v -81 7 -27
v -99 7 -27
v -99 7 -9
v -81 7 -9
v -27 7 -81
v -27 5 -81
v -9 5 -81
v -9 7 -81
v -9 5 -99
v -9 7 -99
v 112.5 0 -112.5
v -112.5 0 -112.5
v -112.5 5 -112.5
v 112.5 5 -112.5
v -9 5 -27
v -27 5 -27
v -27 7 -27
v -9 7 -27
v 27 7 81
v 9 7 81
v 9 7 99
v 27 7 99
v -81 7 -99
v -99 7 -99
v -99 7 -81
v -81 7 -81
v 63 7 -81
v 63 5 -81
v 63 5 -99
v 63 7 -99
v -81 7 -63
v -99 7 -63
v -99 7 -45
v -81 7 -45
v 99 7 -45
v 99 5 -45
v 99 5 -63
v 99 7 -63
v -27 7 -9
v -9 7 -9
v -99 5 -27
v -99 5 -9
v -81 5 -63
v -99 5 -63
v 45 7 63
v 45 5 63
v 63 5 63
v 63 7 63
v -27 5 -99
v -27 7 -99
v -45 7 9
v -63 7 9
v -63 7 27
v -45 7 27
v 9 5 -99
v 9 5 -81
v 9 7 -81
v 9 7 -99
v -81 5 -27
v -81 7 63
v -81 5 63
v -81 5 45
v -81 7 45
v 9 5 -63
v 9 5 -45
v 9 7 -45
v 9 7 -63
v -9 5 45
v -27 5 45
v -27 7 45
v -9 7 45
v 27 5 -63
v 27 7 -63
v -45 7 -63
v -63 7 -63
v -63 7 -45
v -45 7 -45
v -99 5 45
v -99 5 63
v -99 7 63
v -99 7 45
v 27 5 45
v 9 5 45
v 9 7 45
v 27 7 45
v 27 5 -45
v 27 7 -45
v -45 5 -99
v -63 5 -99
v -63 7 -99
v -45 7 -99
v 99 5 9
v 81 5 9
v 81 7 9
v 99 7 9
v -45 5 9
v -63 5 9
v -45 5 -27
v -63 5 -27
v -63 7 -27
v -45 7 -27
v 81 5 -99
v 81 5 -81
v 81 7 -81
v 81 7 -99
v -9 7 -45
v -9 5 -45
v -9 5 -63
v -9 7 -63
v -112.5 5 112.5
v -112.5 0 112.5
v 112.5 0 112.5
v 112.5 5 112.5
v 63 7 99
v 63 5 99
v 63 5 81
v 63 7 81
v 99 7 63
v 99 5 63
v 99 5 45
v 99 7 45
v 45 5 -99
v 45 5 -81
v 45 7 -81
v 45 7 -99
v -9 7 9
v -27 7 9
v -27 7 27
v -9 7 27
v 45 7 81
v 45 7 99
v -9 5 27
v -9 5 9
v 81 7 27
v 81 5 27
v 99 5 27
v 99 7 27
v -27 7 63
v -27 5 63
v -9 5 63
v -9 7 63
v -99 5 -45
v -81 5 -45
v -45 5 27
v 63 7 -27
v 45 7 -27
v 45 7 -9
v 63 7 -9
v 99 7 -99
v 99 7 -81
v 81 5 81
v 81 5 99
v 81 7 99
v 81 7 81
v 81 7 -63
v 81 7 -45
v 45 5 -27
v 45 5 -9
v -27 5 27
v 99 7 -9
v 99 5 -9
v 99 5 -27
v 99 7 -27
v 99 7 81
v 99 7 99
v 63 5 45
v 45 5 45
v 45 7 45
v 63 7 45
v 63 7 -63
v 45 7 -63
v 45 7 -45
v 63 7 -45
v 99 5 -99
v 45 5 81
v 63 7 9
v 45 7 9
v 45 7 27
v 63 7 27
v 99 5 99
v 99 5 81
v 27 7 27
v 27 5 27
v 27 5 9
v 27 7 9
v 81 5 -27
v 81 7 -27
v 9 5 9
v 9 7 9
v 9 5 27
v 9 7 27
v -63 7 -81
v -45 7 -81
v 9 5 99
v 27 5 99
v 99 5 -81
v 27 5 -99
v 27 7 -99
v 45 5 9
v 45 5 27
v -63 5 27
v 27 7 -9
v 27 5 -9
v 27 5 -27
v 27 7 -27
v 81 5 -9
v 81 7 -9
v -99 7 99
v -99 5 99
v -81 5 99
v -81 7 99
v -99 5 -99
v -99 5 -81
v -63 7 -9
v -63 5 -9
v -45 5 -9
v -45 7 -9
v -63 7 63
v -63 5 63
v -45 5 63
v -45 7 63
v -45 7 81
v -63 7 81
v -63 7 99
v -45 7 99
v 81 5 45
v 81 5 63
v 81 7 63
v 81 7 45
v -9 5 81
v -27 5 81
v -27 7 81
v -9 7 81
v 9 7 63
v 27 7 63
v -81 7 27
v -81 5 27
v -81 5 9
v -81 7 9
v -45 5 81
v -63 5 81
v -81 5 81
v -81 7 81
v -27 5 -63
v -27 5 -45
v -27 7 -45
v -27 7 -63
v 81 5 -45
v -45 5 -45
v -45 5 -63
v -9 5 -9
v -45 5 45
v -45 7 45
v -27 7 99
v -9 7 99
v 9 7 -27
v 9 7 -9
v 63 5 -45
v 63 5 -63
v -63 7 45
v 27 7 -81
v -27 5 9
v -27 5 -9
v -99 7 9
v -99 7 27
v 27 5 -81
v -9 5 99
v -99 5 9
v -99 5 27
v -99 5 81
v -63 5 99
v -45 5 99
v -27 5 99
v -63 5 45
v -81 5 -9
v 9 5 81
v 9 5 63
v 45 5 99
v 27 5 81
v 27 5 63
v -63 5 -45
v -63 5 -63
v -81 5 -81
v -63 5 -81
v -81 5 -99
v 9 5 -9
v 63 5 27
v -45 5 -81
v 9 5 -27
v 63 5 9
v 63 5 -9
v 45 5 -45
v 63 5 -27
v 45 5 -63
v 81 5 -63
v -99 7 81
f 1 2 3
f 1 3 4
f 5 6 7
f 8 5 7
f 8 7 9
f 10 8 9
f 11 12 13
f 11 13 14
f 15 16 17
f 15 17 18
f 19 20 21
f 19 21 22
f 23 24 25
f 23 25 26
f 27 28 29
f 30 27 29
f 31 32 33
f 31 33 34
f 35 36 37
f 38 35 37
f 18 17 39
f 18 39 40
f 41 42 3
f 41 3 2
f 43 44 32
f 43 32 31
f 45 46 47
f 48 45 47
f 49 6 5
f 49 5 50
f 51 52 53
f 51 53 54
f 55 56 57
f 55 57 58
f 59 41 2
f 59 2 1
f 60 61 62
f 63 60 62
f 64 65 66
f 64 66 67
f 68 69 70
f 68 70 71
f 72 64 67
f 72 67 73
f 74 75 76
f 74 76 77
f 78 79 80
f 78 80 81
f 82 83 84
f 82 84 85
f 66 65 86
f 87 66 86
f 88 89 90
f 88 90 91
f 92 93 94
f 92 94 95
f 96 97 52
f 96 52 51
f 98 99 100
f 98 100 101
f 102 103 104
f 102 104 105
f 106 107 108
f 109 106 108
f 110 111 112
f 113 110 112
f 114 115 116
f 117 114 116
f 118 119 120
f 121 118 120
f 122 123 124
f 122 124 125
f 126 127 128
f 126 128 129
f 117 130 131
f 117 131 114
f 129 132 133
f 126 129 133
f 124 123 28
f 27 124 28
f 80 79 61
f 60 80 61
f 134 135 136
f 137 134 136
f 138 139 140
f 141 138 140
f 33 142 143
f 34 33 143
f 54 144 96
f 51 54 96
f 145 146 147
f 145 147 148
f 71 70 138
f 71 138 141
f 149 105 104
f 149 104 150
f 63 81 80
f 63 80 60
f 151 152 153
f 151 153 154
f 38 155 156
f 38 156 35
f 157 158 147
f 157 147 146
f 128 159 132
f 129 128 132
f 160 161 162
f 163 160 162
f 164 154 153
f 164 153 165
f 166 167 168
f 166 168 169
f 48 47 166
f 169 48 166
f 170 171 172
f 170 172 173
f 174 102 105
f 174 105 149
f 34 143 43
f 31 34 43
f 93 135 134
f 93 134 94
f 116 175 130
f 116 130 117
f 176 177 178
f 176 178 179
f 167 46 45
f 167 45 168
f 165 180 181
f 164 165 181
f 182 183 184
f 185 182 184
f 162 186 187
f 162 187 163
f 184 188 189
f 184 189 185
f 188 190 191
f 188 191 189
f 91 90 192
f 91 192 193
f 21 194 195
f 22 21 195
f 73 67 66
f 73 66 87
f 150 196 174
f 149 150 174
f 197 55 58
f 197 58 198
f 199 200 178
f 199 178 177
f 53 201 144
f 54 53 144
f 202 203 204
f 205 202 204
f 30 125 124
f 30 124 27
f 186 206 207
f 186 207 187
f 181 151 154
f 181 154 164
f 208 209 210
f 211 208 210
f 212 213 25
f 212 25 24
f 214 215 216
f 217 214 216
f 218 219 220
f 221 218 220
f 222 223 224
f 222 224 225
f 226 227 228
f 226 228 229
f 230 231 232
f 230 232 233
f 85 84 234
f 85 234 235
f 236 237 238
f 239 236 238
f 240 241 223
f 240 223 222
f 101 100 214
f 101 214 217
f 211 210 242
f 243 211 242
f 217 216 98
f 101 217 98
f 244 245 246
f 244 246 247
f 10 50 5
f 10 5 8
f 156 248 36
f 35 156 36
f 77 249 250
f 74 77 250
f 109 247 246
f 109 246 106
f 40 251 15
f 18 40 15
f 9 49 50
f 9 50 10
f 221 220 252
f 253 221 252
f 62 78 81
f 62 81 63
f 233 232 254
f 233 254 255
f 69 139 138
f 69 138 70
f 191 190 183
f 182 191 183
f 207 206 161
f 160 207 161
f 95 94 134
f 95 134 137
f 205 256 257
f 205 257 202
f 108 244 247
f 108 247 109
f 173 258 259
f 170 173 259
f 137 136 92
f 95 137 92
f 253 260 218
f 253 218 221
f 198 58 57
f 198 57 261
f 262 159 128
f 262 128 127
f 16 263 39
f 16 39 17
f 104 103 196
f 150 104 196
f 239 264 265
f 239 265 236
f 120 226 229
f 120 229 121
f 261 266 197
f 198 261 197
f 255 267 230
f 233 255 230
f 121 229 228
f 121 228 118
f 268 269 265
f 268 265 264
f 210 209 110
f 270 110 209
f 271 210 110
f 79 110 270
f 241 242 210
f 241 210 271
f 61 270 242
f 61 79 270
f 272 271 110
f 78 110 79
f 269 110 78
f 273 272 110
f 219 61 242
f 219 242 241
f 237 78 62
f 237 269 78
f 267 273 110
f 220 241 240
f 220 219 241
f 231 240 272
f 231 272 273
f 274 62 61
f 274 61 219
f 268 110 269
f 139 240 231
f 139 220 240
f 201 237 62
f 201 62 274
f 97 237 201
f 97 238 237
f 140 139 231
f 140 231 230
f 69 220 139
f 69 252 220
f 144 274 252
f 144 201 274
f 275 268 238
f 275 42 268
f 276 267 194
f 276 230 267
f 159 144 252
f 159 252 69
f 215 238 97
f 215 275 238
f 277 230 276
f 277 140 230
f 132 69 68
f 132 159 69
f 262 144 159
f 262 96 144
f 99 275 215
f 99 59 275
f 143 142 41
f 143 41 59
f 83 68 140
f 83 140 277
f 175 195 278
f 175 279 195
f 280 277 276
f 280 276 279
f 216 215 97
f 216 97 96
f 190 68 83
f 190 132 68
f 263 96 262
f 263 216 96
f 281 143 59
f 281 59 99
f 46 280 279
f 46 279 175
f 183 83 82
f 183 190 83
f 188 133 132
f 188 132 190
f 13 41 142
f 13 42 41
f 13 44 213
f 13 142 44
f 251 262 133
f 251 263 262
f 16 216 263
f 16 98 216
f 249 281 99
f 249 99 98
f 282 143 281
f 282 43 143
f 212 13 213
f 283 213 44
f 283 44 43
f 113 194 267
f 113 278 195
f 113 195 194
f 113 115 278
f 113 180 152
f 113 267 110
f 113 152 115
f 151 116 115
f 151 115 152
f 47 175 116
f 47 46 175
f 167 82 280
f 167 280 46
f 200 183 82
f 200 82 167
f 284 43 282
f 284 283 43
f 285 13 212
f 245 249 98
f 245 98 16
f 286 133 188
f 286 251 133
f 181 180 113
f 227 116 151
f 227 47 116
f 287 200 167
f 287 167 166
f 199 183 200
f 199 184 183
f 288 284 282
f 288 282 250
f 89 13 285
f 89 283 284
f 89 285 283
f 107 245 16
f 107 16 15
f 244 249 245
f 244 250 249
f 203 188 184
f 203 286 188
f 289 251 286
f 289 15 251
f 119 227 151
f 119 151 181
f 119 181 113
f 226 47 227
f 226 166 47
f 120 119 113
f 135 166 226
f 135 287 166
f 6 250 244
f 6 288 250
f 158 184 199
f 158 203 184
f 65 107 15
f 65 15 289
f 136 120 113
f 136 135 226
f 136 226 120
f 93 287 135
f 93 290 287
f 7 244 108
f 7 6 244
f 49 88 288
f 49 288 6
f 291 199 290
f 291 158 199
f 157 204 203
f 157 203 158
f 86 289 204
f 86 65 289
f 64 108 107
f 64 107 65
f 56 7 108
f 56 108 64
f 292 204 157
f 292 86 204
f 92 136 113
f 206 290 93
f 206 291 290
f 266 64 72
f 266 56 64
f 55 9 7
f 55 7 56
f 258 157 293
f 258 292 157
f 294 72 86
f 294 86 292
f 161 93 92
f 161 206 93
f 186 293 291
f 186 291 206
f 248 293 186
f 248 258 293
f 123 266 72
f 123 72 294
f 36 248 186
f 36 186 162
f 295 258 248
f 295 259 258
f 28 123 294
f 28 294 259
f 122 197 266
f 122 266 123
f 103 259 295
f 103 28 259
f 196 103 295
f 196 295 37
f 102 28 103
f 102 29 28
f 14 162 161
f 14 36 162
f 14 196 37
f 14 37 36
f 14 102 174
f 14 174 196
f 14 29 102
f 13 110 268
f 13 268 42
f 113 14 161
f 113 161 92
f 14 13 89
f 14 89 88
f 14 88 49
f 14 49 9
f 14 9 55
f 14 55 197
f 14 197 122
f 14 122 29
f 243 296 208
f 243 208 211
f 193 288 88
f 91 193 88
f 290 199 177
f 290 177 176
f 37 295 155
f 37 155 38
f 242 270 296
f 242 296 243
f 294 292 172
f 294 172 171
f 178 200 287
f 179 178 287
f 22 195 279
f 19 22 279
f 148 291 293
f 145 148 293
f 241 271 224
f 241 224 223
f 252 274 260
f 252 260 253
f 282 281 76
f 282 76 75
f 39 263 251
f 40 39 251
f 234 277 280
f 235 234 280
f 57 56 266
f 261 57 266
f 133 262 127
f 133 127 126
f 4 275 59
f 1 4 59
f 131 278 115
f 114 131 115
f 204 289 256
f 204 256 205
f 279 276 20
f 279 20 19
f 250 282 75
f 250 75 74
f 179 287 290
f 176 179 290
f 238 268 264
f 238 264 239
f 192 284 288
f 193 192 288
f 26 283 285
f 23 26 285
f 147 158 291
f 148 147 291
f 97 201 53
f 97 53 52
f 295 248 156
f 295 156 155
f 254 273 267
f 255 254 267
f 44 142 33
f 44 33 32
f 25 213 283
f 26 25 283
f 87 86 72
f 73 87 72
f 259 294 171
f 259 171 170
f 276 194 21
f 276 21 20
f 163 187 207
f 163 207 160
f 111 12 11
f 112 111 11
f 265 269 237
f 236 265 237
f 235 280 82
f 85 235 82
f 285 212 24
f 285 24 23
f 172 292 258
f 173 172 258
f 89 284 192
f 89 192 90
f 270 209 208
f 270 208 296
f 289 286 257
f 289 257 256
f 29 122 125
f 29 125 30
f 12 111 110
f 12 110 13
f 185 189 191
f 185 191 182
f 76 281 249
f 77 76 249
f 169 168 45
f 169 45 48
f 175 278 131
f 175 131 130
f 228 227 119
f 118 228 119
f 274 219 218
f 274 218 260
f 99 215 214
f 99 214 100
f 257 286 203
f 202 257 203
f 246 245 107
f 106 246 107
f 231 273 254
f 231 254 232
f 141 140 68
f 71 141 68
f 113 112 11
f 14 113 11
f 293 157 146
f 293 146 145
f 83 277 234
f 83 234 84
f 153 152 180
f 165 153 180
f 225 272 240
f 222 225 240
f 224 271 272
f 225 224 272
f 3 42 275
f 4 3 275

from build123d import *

# Parameters (mm, degrees)
SKETCH1_W            = 225
SKETCH1_H            = 225
BOSS_EXTRUDE1_DEPTH  = 5
SKETCH2_W            = 18
SKETCH2_H            = 18
BOSS_EXTRUDE2_DEPTH  = 2
LPATTERN1_COUNT      = 6
LPATTERN1_PITCH      = 36
LPATTERN1_COUNT_DIR2 = 6
LPATTERN1_PITCH_DIR2 = 36


with BuildPart() as part:
    # Sketch1 → Boss-Extrude1 (new body)
    with BuildSketch(Plane(origin=(0, 0, 0), x_dir=(1, 0, 0), z_dir=(0, 1, 0))):
        Rectangle(SKETCH1_W, SKETCH1_H)
    extrude(amount=BOSS_EXTRUDE1_DEPTH)

    # Sketch2 → Boss-Extrude2 (add)
    with BuildSketch(Plane(origin=(0, 5, 0), x_dir=(1, 0, 0), z_dir=(0, 1, 0))):
        with Locations((-90, 90)):
            Rectangle(SKETCH2_W, SKETCH2_H)
    boss_extrude2 = extrude(amount=BOSS_EXTRUDE2_DEPTH)

    # LPattern1: Boss-Extrude2 6 × 6
    with Locations(*[(i * LPATTERN1_PITCH, 0, j * LPATTERN1_PITCH_DIR2) for i in range(LPATTERN1_COUNT) for j in range(LPATTERN1_COUNT_DIR2) if (i, j) != (0, 0)]):
        add(boss_extrude2)


solid = part.part
